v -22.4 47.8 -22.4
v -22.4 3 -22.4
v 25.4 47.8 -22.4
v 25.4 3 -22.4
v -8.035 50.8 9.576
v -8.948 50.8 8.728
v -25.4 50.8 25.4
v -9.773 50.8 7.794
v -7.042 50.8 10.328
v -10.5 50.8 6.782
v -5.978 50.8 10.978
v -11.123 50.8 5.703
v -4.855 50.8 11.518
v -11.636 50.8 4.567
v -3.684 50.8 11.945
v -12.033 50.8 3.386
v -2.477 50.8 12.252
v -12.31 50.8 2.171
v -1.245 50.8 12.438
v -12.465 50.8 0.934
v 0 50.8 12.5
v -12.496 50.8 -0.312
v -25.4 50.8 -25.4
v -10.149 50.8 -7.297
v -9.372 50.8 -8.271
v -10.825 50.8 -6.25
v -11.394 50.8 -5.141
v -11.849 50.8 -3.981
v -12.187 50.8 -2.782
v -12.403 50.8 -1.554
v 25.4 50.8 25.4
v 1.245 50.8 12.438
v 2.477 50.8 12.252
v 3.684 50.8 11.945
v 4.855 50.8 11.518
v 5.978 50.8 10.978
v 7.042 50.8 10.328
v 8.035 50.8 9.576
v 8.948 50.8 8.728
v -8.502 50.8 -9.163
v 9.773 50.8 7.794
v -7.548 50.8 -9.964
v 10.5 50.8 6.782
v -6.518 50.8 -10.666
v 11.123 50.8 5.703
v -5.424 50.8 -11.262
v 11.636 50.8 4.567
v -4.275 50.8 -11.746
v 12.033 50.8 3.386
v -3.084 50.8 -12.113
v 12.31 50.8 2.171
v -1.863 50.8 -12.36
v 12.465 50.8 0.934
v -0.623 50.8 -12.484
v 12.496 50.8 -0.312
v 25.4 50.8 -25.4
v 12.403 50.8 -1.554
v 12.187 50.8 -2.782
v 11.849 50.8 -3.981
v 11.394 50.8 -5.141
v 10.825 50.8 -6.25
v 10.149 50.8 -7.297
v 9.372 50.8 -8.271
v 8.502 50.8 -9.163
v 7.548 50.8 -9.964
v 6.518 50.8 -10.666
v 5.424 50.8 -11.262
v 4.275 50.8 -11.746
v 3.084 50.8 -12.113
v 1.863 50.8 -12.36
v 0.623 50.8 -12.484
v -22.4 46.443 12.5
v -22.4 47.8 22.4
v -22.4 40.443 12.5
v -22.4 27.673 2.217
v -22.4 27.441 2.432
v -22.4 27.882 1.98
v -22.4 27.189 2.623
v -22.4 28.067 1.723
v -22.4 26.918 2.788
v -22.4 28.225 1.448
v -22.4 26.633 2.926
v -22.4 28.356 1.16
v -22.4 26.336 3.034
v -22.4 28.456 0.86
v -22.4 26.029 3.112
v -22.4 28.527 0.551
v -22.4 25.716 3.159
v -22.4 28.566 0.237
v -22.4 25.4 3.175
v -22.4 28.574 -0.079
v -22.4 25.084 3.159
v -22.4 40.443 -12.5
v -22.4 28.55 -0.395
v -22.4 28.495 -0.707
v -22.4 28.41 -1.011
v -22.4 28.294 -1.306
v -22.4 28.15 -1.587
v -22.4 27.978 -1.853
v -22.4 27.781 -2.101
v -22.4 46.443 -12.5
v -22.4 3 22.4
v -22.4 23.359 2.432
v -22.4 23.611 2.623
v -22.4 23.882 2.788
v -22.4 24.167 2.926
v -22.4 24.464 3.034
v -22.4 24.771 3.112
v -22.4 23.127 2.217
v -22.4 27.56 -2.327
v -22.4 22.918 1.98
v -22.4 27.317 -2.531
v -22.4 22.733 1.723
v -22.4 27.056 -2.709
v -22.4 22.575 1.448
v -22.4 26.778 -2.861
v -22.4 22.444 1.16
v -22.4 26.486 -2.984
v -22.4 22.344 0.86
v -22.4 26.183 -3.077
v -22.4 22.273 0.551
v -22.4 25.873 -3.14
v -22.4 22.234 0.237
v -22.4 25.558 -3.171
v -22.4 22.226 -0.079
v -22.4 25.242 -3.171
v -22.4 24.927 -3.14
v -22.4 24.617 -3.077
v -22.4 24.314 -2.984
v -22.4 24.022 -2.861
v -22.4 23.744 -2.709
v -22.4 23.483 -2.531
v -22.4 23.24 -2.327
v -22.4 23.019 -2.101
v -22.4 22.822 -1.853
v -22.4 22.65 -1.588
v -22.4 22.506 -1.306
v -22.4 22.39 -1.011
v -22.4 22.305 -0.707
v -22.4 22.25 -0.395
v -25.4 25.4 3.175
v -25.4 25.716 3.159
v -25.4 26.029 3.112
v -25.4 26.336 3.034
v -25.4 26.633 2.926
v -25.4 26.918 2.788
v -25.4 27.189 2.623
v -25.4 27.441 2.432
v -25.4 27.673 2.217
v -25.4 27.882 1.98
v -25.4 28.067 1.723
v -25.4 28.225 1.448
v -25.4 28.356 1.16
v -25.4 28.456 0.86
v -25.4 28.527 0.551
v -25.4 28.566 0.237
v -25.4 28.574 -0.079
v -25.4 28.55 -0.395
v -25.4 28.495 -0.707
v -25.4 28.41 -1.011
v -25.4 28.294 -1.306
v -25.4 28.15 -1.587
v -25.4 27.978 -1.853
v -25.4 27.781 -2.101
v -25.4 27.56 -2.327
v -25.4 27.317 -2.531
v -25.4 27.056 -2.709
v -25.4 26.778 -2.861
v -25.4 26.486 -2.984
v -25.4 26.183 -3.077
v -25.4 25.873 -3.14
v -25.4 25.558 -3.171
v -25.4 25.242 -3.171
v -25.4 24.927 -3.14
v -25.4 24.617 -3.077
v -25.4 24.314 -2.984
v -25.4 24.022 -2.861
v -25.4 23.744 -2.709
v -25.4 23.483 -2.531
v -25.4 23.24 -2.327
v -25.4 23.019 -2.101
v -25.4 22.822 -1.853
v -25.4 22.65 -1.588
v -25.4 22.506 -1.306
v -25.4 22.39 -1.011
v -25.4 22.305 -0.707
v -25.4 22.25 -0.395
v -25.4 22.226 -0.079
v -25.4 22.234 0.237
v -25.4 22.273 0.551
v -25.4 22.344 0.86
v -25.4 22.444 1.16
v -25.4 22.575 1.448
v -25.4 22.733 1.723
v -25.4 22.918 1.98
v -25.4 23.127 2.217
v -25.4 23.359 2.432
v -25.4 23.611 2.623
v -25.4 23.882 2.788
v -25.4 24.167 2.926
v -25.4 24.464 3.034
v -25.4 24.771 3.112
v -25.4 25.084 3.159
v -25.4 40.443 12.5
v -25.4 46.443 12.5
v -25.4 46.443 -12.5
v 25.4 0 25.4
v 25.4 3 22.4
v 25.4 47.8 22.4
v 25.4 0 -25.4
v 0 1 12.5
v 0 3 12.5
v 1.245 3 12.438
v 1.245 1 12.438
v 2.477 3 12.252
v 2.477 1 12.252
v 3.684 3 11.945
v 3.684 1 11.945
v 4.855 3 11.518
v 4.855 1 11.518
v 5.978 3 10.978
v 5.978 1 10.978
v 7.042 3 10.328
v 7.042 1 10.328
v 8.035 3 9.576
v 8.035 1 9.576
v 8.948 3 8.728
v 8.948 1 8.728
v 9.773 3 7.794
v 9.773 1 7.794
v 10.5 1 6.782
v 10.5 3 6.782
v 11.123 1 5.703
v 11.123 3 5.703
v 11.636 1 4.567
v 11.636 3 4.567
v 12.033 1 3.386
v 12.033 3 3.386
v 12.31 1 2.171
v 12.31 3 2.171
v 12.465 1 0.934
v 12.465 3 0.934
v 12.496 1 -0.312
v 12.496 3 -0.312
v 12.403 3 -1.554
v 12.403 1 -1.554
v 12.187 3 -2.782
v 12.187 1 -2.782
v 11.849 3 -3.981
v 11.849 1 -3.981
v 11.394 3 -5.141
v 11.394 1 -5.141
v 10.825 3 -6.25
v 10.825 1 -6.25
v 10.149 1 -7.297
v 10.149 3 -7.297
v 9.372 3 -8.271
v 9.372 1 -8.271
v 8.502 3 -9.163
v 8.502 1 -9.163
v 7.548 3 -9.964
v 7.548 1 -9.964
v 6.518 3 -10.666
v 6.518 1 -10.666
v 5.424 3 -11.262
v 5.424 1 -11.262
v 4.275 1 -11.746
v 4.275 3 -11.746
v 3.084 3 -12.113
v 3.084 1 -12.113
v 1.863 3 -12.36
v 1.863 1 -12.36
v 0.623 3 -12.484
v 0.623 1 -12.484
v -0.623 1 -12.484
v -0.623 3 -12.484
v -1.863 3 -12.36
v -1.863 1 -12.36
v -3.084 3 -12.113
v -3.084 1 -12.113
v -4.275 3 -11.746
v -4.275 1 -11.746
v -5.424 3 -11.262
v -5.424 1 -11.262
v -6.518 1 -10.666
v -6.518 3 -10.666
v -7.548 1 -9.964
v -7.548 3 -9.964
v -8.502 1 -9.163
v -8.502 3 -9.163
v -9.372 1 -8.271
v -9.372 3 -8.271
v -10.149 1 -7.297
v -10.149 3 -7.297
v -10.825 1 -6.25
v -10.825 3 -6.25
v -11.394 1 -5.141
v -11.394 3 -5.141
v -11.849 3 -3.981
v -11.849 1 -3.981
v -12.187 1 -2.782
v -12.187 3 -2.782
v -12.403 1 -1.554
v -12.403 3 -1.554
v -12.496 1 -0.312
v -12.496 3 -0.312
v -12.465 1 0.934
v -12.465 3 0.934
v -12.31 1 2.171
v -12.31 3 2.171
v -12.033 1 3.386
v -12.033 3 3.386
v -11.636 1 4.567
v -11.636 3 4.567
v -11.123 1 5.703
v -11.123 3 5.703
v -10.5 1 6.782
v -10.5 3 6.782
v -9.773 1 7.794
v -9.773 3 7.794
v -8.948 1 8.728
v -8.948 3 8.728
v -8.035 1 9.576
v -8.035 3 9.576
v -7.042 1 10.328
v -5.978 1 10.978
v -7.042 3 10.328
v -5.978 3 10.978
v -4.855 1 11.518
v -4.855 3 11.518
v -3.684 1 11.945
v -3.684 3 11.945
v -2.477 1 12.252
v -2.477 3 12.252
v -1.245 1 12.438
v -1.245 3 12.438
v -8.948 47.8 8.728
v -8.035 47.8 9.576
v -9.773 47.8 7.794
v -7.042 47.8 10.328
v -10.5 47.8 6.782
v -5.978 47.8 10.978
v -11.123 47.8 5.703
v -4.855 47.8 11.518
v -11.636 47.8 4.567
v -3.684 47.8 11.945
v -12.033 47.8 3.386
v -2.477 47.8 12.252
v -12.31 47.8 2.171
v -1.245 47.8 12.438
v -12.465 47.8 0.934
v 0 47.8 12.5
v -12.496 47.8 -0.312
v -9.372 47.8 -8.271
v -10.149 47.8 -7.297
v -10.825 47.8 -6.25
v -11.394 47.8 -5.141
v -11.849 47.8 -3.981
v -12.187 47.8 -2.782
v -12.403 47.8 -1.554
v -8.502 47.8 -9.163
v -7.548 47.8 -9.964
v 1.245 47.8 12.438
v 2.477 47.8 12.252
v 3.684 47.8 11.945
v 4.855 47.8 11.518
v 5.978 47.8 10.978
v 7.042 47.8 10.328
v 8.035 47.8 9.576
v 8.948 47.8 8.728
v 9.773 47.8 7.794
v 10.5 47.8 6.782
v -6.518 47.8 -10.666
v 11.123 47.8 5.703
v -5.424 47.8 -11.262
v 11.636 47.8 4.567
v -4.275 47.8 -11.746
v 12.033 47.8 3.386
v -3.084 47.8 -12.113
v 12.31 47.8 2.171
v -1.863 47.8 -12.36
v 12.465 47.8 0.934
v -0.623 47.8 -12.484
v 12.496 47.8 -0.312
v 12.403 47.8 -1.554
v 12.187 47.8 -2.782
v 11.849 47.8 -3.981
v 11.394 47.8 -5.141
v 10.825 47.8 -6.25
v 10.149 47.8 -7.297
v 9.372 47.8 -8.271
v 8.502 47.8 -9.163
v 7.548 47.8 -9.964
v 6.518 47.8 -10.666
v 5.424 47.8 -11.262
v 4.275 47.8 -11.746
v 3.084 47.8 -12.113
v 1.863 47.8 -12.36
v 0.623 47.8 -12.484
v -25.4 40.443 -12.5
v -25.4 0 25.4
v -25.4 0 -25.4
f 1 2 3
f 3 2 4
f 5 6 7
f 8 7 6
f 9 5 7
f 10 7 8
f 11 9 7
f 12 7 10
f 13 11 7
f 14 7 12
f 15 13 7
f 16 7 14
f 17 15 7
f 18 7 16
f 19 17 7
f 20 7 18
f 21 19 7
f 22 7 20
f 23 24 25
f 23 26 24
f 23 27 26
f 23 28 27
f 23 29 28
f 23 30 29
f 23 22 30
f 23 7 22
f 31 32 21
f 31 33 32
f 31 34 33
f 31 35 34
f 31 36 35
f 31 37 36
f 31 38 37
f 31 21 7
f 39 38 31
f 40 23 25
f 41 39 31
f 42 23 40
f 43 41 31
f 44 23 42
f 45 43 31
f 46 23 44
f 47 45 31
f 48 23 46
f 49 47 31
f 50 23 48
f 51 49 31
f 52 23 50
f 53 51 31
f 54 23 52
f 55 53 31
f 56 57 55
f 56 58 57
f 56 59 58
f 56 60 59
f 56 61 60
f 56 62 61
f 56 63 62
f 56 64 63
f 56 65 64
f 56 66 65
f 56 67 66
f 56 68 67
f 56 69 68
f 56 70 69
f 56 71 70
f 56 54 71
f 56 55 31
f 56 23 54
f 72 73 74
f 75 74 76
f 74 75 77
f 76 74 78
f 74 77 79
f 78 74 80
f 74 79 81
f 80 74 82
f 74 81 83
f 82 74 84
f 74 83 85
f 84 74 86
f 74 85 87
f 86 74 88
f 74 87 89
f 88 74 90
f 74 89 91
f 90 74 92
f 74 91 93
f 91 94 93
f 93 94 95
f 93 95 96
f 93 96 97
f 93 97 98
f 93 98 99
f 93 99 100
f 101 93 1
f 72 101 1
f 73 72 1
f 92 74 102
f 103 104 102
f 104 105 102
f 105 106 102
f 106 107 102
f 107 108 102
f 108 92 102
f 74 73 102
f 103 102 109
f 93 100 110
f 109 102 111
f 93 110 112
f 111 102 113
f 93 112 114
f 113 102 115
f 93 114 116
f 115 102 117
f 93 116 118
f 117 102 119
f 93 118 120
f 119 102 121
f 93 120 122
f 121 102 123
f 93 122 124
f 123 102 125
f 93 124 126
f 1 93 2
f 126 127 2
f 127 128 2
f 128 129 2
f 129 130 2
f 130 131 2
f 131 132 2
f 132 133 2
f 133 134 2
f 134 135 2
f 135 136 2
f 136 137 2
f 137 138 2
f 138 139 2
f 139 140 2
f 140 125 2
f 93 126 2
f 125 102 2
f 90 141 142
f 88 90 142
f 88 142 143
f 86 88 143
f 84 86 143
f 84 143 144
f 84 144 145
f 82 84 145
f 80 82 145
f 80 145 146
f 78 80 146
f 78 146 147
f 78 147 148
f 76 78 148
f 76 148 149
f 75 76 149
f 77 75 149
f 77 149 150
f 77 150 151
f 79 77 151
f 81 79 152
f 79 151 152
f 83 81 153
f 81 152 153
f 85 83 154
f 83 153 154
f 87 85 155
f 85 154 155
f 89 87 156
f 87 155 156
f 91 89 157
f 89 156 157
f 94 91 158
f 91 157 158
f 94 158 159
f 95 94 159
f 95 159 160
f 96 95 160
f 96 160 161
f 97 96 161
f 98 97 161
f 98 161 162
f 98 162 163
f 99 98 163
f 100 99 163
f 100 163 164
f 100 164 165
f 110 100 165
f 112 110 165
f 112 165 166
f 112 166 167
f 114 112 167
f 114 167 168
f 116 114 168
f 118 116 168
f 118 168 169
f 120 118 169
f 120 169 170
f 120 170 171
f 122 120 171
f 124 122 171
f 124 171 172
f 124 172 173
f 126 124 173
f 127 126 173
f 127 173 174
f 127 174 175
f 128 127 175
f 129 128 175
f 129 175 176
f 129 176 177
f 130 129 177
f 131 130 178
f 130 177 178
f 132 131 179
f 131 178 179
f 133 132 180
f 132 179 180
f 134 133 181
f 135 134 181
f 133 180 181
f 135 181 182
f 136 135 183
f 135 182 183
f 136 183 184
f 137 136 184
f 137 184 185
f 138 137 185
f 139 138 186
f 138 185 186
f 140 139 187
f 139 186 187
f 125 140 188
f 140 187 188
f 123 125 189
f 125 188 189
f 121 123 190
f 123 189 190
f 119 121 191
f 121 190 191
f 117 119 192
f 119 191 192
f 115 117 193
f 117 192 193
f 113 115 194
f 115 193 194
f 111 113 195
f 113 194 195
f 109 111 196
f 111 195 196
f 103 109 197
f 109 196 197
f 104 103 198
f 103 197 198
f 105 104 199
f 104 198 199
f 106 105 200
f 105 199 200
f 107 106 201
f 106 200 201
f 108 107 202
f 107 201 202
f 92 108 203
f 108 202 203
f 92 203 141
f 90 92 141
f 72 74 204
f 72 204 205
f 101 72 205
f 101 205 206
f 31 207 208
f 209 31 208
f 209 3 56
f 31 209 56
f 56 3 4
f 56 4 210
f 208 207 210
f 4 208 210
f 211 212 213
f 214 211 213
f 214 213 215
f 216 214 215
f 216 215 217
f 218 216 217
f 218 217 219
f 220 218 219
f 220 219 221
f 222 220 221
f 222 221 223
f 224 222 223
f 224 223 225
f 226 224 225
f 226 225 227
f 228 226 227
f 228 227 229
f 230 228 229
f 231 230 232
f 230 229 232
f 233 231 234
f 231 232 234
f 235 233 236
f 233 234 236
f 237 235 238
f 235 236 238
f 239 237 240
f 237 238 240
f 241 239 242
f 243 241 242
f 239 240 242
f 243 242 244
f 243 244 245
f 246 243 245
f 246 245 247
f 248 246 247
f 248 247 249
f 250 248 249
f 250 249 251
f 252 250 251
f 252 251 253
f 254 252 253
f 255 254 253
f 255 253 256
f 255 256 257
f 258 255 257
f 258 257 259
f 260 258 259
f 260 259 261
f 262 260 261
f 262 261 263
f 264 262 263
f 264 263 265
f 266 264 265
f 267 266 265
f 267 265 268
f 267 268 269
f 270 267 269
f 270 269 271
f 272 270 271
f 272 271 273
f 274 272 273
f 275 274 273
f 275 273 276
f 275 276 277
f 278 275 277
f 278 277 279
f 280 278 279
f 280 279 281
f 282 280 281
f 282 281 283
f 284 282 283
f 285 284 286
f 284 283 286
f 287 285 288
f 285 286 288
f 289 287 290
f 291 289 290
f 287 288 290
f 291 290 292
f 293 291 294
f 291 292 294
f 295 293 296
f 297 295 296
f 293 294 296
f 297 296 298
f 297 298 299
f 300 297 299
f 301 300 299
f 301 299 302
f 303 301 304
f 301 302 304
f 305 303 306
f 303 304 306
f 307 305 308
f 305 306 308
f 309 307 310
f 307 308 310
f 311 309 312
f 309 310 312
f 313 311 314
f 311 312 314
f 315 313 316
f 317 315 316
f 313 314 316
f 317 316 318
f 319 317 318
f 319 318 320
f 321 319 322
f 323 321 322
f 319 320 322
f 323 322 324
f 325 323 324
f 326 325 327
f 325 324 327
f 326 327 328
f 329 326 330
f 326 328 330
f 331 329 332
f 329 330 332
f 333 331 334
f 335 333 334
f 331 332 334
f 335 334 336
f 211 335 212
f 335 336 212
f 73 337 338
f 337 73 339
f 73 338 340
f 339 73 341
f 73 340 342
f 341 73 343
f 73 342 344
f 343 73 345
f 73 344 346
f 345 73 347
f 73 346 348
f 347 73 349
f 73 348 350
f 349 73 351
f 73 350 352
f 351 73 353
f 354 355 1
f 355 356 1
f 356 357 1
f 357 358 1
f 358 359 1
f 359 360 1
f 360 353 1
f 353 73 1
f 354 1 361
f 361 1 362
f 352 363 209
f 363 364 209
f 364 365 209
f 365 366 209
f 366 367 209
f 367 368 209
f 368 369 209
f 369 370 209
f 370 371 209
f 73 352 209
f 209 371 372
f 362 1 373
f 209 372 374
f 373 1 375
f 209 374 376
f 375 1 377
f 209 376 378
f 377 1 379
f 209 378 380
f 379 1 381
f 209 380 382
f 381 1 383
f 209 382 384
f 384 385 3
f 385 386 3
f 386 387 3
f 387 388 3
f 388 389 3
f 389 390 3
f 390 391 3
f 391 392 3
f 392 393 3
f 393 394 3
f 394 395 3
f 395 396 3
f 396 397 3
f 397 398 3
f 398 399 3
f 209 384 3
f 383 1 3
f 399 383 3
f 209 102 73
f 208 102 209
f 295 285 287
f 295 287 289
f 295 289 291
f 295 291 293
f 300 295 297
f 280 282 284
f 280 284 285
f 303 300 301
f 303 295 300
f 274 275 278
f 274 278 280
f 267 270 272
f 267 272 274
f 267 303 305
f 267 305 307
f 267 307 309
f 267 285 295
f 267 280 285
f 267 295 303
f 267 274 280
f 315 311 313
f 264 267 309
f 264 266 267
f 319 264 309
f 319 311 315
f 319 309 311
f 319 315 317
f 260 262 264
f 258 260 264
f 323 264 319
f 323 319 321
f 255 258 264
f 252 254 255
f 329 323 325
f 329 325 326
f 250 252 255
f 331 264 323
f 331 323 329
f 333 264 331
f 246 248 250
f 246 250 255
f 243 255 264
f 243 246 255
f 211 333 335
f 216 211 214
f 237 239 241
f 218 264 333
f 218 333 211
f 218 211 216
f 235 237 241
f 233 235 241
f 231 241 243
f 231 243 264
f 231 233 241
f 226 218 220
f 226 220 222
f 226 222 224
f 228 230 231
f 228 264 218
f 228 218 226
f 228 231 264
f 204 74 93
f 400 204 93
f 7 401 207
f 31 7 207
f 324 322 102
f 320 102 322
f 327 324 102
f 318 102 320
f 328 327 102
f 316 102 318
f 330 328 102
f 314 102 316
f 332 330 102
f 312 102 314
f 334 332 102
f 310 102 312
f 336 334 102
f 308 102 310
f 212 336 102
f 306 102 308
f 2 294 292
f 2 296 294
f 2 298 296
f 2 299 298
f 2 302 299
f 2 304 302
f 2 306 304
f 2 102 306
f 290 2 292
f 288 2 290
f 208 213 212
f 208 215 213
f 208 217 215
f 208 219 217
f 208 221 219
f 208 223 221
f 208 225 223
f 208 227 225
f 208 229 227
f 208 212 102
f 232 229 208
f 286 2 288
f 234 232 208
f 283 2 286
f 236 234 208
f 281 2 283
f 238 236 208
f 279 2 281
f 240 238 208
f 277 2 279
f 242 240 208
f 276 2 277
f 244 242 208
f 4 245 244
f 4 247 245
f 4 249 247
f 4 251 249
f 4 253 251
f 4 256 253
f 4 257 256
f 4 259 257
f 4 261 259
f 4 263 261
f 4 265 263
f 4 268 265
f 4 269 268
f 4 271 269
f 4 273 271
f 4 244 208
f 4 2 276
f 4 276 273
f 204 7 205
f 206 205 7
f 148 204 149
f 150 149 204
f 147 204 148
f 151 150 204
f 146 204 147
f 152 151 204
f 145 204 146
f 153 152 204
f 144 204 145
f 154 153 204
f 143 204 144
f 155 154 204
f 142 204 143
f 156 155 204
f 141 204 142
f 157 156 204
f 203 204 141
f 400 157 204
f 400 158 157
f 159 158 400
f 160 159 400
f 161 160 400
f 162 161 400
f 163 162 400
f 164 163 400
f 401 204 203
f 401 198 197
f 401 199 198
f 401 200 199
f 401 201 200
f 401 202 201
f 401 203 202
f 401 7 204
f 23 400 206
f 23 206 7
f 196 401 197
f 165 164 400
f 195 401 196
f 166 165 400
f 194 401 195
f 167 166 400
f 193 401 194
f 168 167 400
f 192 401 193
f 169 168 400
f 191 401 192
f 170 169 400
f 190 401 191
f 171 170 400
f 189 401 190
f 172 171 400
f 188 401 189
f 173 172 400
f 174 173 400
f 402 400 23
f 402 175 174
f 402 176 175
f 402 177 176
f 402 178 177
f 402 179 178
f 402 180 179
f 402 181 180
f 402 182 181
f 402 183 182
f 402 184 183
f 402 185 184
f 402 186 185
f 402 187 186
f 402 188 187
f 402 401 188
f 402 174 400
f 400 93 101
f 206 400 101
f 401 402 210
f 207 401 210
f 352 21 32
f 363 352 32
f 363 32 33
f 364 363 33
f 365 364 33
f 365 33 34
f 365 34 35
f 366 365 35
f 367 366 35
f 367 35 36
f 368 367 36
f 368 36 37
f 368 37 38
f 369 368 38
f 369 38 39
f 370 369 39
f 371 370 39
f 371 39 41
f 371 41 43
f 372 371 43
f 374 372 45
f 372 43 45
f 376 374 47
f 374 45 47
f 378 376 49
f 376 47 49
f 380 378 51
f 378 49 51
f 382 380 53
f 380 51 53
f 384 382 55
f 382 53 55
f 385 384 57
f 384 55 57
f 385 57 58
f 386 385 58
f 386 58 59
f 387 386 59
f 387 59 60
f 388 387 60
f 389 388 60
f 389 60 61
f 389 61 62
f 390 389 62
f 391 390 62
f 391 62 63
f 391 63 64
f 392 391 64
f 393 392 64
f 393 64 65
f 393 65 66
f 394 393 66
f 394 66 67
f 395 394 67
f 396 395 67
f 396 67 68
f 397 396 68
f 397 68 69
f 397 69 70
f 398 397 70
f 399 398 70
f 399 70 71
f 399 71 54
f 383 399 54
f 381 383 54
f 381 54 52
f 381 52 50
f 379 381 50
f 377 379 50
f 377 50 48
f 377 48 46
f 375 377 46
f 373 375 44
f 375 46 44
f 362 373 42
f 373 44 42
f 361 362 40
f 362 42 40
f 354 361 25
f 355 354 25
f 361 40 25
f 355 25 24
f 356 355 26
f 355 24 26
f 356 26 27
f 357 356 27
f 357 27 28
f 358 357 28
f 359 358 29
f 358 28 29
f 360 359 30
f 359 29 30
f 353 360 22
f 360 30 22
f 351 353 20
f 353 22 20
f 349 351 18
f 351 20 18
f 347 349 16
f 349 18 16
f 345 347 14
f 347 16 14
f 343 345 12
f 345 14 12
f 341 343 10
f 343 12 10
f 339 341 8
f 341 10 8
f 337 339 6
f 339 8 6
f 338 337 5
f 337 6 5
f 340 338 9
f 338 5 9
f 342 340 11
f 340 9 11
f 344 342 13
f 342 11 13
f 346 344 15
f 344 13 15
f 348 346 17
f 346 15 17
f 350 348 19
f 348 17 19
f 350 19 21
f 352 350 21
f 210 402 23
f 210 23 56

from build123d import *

# Parameters (mm, degrees)
SKETCH1_W           = 50.8
SKETCH1_H           = 50.8
BOSS_EXTRUDE1_DEPTH = 50.8
SHELL1_T            = -3
SKETCH2_R           = 3.175
CUT_EXTRUDE1_DEPTH  = 50.8
SKETCH3_R           = 12.5
CUT_EXTRUDE2_DEPTH  = 49.8
SKETCH4_W           = 25
SKETCH4_H           = 6
CUT_EXTRUDE3_DEPTH  = 49.8


with BuildPart() as part:
    # Sketch1 → Boss-Extrude1 (new body)
    with BuildSketch(Plane(origin=(0, 0, 0), x_dir=(1, 0, 0), z_dir=(0, 1, 0))):
        Rectangle(SKETCH1_W, SKETCH1_H)
    extrude(amount=BOSS_EXTRUDE1_DEPTH)

    # Shell1
    shell1_openings = [part.faces().sort_by_distance(p)[0] for p in [
        (25.4, 25.4, 0),
    ]]
    offset(amount=SHELL1_T, openings=shell1_openings, kind=Kind.INTERSECTION)

    # Sketch2 → Cut-Extrude1 (cut)
    with BuildSketch(Plane.ZY.offset(25.4)):
        with Locations((0, 25.4)):
            Circle(SKETCH2_R)
    extrude(amount=-CUT_EXTRUDE1_DEPTH, mode=Mode.SUBTRACT)

    # Sketch3 → Cut-Extrude2 (cut)
    with BuildSketch(Plane(origin=(0, 50.8, 0), x_dir=(1, 0, 0), z_dir=(0, 1, 0))):
        with Locations(Location((0, 0, 0), (0, 0, 270))):
            Circle(SKETCH3_R)
    extrude(amount=-CUT_EXTRUDE2_DEPTH, mode=Mode.SUBTRACT)

    # Sketch4 → Cut-Extrude3 (cut)
    with BuildSketch(Plane(origin=(-22.4, 0, 0), x_dir=(0, 0, -1), z_dir=(1, 0, 0))):
        with Locations((0, 43.442725036)):
            Rectangle(SKETCH4_W, SKETCH4_H)
    extrude(amount=-CUT_EXTRUDE3_DEPTH, mode=Mode.SUBTRACT)


solid = part.part
